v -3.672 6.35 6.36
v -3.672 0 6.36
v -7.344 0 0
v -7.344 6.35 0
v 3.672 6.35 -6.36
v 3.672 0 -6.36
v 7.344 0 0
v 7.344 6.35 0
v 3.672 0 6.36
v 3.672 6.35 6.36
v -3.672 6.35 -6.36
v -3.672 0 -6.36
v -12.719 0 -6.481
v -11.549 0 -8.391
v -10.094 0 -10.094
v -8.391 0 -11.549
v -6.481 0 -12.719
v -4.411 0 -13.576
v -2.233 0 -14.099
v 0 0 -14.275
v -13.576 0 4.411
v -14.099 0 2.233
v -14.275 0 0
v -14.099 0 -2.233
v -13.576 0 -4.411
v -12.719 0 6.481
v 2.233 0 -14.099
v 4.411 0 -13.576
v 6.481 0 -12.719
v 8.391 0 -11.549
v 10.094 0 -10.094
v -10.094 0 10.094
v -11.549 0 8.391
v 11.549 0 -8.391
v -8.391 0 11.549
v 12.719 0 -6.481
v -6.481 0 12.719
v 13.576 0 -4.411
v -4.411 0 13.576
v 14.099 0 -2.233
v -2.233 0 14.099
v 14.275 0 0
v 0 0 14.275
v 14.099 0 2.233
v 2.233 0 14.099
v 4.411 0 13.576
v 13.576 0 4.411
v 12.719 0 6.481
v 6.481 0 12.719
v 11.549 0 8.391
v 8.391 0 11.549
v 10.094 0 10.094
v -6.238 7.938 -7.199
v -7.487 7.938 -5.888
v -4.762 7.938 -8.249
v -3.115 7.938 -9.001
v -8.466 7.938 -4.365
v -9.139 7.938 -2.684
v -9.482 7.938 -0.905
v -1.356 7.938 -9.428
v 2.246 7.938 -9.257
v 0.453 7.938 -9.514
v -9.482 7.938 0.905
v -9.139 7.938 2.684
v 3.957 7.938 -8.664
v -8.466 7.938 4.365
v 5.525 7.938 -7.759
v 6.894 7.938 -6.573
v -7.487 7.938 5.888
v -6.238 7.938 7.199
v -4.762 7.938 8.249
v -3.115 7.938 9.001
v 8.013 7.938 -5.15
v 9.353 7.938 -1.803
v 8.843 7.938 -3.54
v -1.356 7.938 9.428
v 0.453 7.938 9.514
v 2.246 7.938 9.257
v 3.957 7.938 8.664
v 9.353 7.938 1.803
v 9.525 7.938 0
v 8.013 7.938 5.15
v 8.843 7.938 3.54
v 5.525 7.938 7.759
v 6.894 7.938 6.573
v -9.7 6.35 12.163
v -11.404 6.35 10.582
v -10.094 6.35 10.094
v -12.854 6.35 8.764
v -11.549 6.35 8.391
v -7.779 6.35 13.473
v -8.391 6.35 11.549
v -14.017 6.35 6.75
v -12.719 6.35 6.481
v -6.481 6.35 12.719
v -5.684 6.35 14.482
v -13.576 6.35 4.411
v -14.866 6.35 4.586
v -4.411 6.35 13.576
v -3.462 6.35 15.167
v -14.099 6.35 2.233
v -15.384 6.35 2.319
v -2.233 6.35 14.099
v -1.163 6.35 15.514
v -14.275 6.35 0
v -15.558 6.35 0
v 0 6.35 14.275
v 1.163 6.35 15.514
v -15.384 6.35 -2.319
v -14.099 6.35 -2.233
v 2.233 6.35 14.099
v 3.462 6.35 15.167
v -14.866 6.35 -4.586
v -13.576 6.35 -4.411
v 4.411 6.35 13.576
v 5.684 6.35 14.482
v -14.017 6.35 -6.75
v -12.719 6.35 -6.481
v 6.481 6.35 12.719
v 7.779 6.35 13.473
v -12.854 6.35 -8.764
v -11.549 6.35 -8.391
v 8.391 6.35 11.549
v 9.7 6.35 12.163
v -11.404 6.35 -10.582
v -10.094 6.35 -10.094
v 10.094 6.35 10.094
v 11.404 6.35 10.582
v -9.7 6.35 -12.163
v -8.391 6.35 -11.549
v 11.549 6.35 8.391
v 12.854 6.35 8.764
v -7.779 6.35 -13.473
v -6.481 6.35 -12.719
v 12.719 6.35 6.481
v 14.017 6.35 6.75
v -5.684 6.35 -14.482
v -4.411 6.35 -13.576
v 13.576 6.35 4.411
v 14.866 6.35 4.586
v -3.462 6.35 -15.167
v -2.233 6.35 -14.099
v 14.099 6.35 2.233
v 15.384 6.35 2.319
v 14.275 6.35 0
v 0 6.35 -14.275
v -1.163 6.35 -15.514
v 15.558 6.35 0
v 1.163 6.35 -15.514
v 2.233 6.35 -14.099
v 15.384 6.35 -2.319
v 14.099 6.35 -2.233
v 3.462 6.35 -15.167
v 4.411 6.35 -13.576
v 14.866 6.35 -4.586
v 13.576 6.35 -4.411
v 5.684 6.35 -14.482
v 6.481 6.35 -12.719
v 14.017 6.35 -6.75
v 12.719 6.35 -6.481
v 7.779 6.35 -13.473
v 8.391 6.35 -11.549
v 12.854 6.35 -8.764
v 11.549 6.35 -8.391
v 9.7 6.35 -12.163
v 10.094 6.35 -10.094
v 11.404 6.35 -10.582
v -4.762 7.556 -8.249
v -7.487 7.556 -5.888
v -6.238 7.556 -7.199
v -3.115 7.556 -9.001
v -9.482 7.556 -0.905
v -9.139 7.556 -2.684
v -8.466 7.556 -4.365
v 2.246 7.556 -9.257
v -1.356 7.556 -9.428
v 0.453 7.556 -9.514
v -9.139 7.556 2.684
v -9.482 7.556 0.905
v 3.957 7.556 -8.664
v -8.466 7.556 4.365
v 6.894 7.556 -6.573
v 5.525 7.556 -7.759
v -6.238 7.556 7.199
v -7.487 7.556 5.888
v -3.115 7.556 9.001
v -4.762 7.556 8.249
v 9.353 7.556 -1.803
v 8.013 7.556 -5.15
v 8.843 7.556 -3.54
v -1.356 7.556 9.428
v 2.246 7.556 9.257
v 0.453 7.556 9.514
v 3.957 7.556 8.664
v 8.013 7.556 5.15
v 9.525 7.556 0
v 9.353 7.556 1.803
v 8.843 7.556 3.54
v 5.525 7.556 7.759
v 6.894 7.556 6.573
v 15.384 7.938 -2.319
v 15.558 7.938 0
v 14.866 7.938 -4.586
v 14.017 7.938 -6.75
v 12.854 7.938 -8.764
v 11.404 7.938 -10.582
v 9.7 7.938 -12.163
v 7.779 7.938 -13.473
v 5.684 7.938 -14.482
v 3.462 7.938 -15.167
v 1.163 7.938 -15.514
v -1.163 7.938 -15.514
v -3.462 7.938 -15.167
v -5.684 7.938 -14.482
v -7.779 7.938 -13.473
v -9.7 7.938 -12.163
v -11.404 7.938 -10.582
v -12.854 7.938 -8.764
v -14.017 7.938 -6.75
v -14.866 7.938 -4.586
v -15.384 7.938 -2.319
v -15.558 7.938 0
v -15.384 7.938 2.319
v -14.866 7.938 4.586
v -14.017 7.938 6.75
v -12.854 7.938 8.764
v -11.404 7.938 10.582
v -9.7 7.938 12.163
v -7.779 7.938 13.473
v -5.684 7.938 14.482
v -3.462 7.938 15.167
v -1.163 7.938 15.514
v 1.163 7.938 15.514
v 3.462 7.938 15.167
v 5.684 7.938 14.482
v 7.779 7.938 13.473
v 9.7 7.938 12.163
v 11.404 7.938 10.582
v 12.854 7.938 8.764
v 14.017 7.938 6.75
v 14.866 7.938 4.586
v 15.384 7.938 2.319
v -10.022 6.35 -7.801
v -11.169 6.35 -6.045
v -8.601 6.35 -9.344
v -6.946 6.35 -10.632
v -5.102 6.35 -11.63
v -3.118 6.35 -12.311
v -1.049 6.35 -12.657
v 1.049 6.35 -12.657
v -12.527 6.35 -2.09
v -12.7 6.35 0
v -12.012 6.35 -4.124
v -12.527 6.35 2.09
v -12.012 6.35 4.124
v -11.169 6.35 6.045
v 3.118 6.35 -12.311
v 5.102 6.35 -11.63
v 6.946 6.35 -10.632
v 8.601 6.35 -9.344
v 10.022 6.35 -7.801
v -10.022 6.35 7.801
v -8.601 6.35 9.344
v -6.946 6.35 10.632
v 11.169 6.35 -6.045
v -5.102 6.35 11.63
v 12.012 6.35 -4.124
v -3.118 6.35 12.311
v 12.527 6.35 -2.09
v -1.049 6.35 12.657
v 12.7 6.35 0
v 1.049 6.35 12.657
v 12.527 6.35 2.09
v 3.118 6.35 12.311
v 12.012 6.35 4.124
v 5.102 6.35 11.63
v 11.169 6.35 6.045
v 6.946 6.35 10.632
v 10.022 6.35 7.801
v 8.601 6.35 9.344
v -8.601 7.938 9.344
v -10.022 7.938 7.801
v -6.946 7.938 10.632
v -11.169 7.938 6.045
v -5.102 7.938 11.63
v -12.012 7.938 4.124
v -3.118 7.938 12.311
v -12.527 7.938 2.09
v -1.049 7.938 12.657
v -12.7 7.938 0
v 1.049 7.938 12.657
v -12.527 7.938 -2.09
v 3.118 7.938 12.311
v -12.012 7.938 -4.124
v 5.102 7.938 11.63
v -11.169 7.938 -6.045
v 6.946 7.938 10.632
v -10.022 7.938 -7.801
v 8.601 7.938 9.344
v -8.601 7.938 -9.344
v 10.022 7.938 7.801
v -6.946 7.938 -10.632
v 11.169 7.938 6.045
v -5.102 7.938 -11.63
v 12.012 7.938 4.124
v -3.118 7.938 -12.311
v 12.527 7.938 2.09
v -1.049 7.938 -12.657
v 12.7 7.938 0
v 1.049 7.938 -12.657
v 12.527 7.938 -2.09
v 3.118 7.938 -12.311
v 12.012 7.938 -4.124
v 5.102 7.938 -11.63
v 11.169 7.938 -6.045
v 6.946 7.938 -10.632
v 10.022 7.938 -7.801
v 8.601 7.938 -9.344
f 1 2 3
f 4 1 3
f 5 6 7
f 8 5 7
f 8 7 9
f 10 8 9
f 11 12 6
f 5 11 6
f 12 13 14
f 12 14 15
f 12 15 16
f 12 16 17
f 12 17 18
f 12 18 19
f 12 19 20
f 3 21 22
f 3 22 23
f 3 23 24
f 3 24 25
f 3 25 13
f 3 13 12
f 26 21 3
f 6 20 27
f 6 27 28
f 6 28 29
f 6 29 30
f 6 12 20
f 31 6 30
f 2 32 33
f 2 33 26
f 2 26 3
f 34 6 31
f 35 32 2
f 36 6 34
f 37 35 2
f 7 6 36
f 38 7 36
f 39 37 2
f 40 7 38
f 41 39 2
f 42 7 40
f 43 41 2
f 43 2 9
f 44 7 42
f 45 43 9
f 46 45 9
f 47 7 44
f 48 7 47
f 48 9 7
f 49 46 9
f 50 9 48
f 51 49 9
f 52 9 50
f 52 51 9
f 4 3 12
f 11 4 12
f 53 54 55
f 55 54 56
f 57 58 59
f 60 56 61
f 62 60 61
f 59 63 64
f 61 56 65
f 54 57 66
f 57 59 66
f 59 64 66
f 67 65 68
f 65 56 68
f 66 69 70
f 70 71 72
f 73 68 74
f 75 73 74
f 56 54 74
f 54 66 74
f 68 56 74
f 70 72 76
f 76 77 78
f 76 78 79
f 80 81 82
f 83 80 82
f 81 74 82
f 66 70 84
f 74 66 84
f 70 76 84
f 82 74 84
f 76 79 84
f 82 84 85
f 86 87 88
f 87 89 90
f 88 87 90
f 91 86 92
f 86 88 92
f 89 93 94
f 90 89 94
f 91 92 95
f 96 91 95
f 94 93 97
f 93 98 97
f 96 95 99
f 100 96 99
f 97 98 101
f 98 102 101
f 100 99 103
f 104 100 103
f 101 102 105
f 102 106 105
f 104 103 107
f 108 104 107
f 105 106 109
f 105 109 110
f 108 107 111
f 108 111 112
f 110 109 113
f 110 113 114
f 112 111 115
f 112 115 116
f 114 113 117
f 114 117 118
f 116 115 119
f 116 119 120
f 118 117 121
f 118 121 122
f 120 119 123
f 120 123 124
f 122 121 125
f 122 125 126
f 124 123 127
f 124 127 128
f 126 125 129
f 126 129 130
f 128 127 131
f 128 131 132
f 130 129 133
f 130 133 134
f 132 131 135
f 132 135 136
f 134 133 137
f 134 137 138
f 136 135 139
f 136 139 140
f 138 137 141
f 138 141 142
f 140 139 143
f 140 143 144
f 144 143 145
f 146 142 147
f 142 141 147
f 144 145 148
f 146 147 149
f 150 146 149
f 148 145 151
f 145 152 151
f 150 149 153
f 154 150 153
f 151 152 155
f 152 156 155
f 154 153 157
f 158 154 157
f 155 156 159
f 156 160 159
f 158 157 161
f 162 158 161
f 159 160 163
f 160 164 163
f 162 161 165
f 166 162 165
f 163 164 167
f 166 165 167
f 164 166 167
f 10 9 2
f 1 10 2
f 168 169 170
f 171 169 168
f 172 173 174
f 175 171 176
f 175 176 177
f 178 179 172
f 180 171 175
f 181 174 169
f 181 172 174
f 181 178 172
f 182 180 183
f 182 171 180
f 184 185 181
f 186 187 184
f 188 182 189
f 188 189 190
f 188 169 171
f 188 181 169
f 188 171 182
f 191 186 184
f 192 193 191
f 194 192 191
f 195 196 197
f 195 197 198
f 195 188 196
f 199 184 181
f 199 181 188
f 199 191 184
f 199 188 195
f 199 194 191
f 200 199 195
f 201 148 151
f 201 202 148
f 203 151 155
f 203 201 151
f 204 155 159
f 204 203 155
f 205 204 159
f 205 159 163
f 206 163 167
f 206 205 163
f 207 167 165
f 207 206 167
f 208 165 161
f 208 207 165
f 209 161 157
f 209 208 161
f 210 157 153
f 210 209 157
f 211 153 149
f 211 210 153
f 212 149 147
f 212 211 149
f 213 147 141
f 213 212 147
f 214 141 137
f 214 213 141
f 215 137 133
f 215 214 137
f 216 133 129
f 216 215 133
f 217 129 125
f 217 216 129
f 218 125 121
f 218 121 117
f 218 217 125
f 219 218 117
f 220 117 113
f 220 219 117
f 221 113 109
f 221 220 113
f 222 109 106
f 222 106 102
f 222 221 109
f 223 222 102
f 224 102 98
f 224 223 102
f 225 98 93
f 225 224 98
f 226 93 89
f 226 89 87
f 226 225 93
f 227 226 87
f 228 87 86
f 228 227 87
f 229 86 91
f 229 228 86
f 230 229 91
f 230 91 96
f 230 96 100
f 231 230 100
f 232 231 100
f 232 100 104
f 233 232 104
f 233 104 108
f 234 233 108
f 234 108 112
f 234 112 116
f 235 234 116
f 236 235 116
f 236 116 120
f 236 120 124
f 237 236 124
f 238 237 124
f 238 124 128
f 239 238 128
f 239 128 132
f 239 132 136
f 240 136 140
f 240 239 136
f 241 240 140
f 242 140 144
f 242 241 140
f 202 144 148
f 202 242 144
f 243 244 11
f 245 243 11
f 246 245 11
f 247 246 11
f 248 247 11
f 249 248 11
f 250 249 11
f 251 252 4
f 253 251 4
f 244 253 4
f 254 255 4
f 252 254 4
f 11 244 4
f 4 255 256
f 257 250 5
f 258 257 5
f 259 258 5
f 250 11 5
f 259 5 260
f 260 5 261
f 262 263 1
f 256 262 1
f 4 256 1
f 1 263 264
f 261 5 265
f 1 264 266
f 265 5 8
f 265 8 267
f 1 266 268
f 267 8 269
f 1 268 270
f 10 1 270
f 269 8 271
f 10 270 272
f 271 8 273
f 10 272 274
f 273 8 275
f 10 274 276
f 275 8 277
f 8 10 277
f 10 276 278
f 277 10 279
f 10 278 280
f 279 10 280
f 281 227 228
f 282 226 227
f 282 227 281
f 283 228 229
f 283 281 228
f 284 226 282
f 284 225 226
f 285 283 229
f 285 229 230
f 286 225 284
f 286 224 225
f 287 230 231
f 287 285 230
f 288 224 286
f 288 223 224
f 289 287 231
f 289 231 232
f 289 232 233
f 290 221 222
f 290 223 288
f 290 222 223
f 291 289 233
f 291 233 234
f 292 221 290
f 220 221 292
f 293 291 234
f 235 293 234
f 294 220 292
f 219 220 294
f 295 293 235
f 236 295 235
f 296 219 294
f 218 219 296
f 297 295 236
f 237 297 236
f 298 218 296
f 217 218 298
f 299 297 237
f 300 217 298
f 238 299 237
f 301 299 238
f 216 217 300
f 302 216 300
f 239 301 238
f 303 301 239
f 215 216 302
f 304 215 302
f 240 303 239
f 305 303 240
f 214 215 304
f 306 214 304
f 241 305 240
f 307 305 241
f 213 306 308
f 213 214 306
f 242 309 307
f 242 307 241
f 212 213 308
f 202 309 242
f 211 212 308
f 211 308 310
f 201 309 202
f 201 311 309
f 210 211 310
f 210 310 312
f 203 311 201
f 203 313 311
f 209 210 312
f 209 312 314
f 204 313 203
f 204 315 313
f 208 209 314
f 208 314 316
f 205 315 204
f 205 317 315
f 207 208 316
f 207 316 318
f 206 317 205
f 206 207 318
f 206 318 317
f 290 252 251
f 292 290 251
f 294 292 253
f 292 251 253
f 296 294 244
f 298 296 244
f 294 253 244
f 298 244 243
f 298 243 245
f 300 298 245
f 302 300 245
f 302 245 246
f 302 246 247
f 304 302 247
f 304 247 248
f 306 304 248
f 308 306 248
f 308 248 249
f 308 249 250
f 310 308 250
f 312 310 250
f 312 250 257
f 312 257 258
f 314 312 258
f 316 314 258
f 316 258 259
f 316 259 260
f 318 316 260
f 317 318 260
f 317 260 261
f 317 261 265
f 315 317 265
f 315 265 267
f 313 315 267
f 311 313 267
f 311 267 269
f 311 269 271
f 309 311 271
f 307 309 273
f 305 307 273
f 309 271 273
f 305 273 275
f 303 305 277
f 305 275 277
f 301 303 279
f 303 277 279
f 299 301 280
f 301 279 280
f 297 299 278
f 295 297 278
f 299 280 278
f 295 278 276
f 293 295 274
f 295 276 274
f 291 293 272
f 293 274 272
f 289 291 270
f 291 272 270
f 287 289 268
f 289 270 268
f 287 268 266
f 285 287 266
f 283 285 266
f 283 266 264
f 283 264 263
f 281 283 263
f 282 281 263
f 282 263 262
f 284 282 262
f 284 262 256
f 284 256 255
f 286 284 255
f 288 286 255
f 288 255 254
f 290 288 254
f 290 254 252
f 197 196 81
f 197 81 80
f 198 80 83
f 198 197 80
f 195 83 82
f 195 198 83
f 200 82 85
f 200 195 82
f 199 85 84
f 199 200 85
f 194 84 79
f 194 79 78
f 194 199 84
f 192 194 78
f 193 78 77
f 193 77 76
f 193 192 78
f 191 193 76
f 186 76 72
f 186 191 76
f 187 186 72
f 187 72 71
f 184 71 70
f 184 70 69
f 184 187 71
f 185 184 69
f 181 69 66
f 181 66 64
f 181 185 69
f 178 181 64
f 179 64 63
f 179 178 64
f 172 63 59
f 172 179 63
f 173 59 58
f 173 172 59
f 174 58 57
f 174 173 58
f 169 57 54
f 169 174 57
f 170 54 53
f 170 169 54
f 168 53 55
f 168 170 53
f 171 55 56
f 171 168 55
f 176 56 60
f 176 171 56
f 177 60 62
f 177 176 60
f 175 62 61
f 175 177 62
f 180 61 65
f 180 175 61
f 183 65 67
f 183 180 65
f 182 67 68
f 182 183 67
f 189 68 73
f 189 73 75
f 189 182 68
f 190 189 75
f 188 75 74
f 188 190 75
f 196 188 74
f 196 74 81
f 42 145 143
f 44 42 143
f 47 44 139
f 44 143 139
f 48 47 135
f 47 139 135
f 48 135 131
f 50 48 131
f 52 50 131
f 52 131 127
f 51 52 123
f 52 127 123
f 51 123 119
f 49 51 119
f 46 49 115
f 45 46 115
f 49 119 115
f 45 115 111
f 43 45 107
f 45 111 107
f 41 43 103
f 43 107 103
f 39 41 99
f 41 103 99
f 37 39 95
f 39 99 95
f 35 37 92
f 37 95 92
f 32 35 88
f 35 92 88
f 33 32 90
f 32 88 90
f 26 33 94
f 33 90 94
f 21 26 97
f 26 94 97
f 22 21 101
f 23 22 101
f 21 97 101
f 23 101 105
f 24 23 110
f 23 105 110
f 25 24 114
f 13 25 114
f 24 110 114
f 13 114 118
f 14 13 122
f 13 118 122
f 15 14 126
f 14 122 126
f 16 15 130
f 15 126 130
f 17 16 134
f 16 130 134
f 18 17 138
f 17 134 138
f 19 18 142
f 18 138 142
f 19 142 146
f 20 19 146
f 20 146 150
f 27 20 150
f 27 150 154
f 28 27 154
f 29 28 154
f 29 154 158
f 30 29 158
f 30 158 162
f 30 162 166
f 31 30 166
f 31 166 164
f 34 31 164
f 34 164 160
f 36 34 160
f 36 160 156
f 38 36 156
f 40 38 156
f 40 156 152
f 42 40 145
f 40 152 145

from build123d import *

# Parameters (mm, degrees)
SKETCH1_W                 = 15.5575
SKETCH1_H                 = 1.5875
M22_CLEARANCE_HOLE1_D     = 25.4
M22_CLEARANCE_HOLE1_DEPTH = 1.5875
SKETCH4_R                 = 9.525
BOSS_EXTRUDE1_DEPTH       = 0.381
SKETCH5_R                 = 14.2748
BOSS_EXTRUDE2_DEPTH       = 6.35
CUT_EXTRUDE1_DEPTH        = 6.35


with BuildPart() as part:
    # Sketch1 → Revolve1 (revolve)
    with BuildSketch(Plane(origin=(0, 0, 0), x_dir=(-1, 0, 0), z_dir=(0, 0, -1))):
        with Locations((-7.77875, 7.14375)):
            Rectangle(SKETCH1_W, SKETCH1_H)
    revolve(axis=Axis((0, 6.35, 0), (0, 1, 0)))

    # M22 Clearance Hole1
    with Locations(Plane(origin=(0, 7.9375, 0), x_dir=(1, 0, 0), z_dir=(0, 1, 0))):
        with Locations((0, 0)):
            Hole(M22_CLEARANCE_HOLE1_D / 2, depth=M22_CLEARANCE_HOLE1_DEPTH)

    # Sketch5 → Boss-Extrude2 (add)
    with BuildSketch(Plane.XZ.offset(-6.35)):
        Circle(SKETCH5_R)
    extrude(amount=BOSS_EXTRUDE2_DEPTH)

    # Sketch6 → Cut-Extrude1 (cut)
    with BuildSketch(Plane.XZ):
        Polygon((-3.671947712, 6.36), (-7.343895424, 0), (-3.671947712, -6.36), (3.671947712, -6.36), (7.343895424, 0), (3.671947712, 6.36), align=None)
    extrude(amount=-CUT_EXTRUDE1_DEPTH, mode=Mode.SUBTRACT)


with BuildPart() as body_2:
    # Sketch4 → Boss-Extrude1 (new body)
    with BuildSketch(Plane.XZ.offset(-7.5565)):
        Circle(SKETCH4_R)
    extrude(amount=-BOSS_EXTRUDE1_DEPTH)


solid = Compound([part.part, body_2.part])
